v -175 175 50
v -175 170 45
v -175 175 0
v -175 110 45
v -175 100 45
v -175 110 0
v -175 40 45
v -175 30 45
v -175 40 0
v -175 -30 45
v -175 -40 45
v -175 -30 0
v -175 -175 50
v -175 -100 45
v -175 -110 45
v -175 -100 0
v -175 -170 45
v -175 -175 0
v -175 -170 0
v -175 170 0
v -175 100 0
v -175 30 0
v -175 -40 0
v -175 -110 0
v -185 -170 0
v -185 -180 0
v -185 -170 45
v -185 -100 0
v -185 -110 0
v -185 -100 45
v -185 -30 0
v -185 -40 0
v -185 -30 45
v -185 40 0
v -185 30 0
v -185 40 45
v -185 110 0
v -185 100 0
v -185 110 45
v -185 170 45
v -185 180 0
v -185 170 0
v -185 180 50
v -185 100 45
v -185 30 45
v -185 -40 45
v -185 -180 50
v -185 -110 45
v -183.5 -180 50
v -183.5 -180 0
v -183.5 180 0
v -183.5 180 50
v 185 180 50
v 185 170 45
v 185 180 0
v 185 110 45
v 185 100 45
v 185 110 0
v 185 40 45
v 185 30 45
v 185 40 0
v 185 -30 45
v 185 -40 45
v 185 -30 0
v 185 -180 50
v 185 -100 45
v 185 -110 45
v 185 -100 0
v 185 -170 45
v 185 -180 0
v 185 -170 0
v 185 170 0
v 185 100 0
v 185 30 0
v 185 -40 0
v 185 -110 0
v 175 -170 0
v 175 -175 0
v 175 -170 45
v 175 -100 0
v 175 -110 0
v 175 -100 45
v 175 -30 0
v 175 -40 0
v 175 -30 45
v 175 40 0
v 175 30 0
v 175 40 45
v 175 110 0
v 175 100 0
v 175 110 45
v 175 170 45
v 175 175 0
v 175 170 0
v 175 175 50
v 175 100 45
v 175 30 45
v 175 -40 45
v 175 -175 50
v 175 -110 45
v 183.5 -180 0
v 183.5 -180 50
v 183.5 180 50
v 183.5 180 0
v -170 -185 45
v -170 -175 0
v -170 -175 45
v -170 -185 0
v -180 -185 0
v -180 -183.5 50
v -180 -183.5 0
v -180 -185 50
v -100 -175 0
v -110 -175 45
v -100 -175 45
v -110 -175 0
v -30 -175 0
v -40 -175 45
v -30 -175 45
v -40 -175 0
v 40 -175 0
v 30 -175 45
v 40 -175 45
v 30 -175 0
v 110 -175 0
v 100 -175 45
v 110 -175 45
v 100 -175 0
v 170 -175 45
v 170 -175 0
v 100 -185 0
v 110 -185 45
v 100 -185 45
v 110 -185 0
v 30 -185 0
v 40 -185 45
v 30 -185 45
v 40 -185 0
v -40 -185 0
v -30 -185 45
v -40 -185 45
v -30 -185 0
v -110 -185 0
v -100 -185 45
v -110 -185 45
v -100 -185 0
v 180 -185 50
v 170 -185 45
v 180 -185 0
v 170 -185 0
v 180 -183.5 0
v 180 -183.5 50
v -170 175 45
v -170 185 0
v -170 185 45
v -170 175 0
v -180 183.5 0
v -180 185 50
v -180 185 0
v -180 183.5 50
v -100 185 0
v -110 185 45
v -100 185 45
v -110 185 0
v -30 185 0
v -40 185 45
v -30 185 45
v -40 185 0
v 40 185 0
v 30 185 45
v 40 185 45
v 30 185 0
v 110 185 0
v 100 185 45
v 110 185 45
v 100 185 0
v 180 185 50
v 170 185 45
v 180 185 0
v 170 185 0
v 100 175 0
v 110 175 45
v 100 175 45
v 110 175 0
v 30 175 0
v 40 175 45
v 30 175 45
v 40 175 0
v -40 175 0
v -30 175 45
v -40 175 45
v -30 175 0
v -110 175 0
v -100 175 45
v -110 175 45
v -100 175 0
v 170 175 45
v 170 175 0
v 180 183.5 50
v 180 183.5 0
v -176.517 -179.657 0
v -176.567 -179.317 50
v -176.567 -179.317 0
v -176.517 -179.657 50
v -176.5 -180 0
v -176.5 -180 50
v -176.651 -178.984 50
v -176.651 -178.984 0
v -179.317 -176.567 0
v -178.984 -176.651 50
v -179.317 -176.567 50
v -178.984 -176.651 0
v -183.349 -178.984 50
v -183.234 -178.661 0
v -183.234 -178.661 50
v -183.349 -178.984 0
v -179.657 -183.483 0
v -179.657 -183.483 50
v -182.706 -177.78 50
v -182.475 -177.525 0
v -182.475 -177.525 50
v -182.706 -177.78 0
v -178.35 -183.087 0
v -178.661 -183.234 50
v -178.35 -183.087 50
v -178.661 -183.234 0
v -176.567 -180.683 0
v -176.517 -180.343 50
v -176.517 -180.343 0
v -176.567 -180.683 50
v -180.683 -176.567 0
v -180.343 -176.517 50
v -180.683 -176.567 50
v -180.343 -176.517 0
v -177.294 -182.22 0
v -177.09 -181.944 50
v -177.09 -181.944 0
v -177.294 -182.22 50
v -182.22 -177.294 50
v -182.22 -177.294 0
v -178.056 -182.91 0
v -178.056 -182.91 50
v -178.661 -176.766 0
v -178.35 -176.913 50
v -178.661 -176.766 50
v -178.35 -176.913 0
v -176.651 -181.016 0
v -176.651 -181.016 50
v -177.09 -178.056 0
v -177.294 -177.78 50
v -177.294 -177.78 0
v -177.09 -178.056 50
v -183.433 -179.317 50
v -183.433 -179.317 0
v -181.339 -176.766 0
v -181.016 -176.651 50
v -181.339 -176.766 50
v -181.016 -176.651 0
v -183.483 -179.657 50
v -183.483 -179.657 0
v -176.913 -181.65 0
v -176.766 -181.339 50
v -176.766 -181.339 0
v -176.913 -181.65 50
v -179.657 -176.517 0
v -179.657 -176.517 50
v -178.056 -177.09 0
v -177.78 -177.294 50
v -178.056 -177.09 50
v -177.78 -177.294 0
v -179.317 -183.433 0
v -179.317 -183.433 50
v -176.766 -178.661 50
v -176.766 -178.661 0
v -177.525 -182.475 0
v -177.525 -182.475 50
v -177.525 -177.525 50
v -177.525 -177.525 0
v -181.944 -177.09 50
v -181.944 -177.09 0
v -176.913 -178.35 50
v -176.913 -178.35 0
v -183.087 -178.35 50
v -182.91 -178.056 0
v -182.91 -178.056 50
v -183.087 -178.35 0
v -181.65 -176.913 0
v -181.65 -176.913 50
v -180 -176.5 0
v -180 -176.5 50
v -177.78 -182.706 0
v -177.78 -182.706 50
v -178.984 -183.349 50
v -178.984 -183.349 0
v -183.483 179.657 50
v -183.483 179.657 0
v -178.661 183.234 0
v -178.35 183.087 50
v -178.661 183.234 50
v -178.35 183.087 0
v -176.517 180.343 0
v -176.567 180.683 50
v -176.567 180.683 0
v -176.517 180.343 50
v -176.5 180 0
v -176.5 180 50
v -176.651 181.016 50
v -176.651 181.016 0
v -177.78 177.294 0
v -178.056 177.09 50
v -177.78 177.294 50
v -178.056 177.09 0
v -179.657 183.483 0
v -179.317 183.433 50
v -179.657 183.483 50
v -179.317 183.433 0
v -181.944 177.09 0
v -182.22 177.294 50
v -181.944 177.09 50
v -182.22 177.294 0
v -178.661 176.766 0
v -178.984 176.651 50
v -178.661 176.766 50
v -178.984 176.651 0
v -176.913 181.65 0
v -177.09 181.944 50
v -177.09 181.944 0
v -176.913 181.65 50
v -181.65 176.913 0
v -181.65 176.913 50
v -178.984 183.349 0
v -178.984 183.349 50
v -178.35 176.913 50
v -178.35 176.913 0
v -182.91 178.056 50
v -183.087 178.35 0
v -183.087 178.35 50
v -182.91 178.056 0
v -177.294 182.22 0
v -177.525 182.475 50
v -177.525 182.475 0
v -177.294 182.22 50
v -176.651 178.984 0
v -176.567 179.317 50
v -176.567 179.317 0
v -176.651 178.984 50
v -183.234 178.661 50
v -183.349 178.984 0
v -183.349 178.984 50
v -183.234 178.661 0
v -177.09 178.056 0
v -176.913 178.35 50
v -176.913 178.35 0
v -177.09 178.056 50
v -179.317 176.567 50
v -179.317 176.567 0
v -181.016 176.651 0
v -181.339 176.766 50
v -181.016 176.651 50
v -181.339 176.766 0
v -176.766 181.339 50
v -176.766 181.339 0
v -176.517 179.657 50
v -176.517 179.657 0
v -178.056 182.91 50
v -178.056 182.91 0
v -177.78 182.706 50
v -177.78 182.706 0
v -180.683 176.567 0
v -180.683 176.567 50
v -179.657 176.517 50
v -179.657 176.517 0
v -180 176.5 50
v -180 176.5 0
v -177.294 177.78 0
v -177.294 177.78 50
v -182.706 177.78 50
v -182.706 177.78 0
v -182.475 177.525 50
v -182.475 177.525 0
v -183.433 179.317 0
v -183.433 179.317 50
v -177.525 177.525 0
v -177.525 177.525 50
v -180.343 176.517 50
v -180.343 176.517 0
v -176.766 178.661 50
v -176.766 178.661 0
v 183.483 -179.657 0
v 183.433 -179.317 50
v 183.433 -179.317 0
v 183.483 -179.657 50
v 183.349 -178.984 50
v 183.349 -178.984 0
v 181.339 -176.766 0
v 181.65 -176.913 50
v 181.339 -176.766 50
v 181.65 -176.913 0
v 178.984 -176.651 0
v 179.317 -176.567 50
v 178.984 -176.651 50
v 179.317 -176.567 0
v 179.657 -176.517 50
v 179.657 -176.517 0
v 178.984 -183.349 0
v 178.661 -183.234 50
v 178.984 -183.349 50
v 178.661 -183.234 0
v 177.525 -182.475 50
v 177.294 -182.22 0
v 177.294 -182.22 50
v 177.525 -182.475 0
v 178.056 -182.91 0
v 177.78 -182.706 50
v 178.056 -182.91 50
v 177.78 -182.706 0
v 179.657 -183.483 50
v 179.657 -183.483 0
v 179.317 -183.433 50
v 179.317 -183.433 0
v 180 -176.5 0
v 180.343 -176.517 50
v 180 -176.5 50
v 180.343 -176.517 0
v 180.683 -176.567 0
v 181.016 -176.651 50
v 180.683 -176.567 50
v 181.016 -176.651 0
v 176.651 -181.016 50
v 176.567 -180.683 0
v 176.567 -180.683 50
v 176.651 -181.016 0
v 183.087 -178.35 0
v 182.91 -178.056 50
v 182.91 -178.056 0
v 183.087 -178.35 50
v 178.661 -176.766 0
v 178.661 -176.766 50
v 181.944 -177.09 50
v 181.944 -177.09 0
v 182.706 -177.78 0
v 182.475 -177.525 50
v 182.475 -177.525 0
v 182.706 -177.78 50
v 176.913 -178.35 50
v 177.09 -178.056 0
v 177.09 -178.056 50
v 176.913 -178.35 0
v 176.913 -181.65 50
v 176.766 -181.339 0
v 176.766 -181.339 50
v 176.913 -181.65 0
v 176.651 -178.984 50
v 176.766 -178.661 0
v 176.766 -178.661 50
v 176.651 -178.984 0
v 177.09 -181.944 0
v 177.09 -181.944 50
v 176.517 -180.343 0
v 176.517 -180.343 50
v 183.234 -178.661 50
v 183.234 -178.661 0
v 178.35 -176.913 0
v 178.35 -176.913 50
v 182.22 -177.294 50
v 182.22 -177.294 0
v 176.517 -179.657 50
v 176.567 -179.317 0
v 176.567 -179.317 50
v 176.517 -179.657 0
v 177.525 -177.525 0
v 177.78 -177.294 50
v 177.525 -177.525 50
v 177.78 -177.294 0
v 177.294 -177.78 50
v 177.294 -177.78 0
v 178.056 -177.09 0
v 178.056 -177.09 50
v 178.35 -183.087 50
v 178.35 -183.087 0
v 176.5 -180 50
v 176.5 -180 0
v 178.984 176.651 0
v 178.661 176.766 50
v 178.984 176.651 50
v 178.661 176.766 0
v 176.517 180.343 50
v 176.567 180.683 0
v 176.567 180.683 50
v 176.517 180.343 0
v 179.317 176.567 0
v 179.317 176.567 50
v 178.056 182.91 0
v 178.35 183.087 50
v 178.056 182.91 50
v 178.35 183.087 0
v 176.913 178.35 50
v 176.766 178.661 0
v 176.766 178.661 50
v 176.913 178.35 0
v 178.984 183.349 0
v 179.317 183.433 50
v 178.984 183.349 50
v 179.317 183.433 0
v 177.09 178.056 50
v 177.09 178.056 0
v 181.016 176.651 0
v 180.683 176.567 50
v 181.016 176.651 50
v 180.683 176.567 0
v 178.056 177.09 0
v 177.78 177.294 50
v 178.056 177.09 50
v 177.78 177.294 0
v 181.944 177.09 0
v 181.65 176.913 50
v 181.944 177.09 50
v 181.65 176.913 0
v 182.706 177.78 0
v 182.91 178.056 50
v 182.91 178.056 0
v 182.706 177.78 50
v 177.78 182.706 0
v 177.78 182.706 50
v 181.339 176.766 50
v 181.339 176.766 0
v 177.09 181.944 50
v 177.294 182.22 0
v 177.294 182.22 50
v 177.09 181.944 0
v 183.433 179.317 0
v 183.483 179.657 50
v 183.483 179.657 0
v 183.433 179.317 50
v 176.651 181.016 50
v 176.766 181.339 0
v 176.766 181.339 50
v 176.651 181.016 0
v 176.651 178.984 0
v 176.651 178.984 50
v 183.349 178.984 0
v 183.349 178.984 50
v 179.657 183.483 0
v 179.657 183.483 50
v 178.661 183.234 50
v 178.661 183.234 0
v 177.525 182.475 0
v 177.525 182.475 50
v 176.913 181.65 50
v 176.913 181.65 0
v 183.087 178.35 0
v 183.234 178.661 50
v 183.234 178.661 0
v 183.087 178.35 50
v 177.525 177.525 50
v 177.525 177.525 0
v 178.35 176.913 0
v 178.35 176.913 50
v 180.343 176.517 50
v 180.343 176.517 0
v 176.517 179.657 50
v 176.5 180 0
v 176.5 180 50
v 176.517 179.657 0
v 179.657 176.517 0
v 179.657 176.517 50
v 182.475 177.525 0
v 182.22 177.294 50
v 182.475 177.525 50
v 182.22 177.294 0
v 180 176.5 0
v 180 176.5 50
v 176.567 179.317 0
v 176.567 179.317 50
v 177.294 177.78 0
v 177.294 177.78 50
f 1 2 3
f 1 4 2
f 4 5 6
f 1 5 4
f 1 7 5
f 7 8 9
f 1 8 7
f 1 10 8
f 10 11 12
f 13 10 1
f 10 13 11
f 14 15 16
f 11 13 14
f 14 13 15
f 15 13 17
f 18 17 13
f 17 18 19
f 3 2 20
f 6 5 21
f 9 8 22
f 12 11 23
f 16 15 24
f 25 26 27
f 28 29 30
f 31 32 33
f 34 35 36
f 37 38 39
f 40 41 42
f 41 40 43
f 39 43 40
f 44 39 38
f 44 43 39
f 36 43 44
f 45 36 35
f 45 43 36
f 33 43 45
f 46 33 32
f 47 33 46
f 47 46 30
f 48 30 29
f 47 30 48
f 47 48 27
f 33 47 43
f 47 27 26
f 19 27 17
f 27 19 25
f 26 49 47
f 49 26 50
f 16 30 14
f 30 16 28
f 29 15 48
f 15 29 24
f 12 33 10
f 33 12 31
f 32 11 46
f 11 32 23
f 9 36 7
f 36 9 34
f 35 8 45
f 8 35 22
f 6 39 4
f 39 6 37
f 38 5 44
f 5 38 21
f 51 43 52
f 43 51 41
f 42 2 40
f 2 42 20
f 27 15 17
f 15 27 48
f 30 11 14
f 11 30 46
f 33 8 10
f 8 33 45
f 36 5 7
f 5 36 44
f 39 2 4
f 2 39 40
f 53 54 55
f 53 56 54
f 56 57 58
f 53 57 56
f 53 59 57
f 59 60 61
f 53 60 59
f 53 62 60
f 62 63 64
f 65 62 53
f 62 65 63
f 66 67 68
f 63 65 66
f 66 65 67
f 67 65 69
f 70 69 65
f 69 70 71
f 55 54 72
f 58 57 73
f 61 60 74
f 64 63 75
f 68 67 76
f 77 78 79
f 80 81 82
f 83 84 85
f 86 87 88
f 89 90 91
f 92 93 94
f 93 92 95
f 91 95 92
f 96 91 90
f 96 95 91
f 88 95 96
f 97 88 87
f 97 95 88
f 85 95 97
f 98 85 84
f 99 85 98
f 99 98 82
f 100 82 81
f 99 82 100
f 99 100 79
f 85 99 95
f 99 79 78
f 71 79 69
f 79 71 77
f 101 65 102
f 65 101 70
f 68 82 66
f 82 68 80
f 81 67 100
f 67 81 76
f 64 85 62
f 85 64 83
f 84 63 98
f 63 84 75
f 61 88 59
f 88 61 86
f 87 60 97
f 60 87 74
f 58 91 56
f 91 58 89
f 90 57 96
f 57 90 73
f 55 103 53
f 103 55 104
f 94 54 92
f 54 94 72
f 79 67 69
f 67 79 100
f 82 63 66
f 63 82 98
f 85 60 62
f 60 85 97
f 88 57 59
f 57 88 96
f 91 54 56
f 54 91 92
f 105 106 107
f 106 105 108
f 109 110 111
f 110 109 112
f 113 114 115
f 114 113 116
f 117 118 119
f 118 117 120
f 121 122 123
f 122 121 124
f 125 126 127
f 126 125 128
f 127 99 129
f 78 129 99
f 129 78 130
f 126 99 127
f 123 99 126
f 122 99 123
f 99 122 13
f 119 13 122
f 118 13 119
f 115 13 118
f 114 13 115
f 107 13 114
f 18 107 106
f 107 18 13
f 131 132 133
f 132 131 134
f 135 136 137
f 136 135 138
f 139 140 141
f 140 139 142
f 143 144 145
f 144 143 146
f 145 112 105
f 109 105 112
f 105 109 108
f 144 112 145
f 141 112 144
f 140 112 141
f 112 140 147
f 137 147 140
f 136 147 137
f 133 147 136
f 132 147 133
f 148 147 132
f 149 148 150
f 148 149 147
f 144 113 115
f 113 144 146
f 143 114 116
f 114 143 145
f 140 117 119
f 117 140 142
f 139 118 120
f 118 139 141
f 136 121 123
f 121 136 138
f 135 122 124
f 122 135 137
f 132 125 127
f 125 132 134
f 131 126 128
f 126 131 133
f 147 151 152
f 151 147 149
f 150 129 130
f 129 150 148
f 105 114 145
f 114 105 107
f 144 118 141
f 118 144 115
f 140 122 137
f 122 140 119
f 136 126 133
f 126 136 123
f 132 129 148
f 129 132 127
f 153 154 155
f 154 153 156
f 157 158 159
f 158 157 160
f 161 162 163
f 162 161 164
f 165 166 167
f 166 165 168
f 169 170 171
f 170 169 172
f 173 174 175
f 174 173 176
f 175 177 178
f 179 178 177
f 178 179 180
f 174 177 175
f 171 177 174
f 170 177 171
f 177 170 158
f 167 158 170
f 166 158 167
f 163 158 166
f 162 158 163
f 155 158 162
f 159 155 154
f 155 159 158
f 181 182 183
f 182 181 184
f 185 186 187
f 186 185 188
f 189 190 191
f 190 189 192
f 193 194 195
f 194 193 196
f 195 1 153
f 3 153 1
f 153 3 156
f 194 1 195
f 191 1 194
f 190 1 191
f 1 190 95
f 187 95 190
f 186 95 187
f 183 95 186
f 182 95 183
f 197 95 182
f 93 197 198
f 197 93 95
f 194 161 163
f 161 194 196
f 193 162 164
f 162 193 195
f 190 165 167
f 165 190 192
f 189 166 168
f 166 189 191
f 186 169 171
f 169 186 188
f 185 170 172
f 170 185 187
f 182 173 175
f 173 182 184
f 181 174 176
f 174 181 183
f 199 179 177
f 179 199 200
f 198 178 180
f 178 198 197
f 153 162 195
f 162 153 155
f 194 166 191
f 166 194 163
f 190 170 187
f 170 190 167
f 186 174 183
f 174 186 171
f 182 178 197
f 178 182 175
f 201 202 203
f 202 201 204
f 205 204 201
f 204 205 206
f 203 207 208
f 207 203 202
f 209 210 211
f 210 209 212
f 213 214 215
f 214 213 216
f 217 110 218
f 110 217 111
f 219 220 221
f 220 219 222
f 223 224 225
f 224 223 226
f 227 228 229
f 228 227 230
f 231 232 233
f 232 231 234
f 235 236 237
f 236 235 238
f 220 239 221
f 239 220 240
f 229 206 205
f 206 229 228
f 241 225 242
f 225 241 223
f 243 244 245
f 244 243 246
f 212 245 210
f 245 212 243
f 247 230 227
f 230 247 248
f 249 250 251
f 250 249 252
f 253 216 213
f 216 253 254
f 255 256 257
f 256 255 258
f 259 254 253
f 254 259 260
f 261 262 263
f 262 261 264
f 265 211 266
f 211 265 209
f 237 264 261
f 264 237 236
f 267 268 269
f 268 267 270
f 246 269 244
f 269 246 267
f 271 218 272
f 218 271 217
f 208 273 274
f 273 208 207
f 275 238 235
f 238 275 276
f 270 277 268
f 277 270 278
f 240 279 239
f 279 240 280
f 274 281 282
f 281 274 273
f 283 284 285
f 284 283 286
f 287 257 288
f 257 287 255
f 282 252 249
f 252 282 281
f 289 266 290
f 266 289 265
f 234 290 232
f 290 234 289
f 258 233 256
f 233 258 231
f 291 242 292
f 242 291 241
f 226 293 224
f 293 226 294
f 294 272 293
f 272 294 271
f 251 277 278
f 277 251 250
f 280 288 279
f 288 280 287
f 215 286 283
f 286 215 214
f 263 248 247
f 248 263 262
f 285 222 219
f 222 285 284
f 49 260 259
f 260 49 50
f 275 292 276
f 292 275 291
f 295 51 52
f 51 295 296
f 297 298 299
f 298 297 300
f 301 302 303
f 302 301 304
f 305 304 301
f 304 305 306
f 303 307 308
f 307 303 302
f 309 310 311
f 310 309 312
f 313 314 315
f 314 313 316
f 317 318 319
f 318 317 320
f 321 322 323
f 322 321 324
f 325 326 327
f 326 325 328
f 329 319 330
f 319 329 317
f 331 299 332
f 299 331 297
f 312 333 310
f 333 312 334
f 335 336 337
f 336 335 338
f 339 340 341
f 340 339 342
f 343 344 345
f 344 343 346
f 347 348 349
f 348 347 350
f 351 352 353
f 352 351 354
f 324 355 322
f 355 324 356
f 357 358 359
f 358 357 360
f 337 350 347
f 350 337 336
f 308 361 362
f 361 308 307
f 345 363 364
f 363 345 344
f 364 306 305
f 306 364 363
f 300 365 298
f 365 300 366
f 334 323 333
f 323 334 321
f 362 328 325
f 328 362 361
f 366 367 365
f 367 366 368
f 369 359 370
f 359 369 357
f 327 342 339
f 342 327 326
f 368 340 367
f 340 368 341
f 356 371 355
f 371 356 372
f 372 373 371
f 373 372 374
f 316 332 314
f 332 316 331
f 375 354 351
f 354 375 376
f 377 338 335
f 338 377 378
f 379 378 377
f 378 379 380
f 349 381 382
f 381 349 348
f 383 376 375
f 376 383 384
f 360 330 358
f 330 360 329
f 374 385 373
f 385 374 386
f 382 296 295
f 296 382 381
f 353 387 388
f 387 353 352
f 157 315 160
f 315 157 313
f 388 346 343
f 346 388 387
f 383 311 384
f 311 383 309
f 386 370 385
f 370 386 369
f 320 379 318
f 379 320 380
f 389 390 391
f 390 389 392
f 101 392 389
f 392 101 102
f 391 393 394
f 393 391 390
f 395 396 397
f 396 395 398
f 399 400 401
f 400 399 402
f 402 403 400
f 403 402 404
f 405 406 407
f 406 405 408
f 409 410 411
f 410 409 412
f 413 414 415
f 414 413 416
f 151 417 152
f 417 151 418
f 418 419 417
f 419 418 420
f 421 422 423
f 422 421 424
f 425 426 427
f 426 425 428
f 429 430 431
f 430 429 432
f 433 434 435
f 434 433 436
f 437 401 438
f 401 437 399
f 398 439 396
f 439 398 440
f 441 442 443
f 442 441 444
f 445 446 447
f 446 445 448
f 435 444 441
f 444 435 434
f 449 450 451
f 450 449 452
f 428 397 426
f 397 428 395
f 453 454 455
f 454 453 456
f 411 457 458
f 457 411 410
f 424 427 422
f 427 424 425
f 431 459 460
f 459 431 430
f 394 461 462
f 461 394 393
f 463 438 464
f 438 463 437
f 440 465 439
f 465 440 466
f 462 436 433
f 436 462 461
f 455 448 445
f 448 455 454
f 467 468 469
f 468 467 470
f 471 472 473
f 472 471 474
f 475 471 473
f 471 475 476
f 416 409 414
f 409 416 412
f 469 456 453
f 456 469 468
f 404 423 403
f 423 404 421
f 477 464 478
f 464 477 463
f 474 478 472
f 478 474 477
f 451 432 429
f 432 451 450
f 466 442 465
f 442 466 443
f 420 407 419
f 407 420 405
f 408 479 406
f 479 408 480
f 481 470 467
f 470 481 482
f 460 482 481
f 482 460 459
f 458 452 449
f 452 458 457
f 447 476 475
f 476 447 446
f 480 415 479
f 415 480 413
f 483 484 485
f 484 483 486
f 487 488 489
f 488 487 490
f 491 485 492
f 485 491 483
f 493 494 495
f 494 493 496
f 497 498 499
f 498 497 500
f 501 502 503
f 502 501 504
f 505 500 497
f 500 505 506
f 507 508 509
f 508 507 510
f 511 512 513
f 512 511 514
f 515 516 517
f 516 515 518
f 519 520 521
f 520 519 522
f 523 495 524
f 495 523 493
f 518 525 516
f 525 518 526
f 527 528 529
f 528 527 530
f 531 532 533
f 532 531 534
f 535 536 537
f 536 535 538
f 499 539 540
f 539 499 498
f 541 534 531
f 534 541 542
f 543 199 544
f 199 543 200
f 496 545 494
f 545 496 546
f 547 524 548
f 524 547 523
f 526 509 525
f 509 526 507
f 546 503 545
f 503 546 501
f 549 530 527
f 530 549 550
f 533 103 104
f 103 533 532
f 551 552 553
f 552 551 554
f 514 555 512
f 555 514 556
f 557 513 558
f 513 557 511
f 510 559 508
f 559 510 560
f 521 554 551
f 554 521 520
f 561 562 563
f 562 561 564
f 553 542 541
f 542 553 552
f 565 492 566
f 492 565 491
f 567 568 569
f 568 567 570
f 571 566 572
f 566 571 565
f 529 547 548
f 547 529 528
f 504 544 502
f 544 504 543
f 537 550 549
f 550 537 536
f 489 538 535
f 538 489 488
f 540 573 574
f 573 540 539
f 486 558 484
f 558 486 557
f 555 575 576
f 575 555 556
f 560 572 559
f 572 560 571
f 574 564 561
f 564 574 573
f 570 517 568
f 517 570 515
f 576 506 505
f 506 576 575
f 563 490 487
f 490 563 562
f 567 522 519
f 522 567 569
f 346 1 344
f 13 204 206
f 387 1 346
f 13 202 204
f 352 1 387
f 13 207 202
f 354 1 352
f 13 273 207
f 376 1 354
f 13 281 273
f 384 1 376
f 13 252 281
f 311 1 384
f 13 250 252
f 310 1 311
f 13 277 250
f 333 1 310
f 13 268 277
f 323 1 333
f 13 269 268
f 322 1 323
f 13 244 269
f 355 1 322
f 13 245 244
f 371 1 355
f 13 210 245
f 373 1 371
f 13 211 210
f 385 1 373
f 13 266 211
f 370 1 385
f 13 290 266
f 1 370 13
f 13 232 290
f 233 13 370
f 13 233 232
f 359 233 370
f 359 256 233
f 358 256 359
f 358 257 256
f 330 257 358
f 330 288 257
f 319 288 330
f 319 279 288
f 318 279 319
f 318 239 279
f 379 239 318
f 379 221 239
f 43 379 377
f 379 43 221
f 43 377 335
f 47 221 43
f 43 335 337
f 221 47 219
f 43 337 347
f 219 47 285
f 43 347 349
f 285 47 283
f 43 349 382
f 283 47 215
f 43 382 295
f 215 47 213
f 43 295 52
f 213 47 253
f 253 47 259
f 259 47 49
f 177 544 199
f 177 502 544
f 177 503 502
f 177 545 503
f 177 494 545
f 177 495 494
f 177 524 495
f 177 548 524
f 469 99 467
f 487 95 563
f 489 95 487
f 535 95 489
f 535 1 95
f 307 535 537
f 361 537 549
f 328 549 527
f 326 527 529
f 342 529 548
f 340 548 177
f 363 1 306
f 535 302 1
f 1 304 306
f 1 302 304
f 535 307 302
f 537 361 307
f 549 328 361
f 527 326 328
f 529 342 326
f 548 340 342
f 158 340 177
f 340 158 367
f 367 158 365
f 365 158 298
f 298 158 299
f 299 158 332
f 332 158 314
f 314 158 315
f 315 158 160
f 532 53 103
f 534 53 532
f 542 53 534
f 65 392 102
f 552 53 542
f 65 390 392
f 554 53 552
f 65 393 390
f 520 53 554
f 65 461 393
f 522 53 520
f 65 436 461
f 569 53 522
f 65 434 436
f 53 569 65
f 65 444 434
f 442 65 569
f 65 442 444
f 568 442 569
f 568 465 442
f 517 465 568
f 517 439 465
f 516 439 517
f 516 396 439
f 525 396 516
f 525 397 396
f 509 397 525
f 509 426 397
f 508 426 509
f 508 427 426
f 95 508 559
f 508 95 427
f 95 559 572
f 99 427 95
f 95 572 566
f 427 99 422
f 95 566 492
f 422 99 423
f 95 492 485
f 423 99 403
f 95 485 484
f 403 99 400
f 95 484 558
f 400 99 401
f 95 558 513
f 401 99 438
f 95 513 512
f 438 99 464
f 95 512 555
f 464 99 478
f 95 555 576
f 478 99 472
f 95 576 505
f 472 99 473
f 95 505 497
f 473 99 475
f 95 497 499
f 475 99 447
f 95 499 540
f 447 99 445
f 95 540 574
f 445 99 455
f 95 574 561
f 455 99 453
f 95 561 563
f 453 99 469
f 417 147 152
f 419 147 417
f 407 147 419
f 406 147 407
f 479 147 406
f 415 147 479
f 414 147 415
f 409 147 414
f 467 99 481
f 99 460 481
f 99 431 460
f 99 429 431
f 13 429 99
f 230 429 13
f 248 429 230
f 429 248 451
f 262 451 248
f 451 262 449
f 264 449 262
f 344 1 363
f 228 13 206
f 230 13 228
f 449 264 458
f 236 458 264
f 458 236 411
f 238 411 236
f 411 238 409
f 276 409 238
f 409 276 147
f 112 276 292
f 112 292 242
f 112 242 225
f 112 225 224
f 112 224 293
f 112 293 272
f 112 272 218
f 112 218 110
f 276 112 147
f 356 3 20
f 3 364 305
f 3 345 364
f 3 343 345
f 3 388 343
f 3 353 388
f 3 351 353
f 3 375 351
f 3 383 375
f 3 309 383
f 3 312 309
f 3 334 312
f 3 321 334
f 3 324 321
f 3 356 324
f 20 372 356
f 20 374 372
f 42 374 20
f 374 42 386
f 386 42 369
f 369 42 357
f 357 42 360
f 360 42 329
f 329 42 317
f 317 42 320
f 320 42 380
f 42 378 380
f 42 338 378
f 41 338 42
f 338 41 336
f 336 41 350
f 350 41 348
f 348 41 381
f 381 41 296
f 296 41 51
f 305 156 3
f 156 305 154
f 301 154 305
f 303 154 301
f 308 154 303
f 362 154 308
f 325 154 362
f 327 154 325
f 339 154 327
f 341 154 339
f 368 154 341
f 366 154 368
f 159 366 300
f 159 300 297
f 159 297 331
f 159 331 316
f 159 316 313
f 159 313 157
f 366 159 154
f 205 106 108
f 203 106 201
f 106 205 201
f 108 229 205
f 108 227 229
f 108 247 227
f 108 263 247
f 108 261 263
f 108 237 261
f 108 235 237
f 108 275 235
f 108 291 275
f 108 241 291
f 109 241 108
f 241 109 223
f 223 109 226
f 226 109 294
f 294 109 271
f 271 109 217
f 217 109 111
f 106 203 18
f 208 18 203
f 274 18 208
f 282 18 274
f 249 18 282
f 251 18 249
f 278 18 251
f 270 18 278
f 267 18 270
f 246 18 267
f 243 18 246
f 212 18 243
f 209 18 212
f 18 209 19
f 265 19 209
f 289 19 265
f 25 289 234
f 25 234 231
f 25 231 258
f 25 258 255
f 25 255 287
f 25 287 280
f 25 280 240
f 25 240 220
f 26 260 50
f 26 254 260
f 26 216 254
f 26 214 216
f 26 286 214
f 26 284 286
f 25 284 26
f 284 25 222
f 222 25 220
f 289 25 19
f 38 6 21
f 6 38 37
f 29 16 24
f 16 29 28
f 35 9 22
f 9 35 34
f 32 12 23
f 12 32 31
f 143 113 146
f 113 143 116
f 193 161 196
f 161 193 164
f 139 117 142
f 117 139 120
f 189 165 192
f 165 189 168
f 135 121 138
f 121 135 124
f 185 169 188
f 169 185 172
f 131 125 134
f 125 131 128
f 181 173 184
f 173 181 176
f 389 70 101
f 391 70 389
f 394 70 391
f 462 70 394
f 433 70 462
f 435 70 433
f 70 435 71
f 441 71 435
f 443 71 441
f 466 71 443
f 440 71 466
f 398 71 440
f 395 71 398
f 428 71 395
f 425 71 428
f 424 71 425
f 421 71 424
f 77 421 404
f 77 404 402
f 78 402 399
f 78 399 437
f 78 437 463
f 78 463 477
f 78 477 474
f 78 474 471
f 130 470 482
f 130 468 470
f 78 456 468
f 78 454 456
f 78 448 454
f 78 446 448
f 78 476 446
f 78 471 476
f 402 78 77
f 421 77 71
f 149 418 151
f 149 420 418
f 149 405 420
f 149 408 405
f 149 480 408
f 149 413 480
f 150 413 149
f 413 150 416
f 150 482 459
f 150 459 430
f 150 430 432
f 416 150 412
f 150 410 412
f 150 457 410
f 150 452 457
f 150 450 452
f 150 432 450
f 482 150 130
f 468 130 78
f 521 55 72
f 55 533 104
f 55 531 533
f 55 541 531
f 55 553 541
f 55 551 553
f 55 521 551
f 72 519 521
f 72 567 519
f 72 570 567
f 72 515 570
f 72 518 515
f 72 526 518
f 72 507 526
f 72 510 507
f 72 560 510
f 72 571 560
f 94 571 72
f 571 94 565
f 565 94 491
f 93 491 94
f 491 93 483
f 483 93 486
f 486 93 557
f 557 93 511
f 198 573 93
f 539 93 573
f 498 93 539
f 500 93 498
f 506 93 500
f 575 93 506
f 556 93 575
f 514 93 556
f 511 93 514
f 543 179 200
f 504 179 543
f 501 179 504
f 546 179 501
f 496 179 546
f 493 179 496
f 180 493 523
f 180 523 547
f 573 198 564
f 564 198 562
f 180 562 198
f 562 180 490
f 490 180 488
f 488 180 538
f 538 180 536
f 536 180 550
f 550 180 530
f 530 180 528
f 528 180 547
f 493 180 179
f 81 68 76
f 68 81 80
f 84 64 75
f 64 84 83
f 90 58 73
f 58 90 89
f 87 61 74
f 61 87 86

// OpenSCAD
/*
  Cage slice 03 of 15
*/

bar = 10;
half_inner = 175;
gap = 70;
rod_d = 7;
half_outer = half_inner + bar;

function grid_pos(n) = -half_inner + n * gap;

module cage_full() {
  difference() {
    union() {
      // Floor grid at z = -10 .. 0
      for (j = [0:5]) {
        y = grid_pos(j);
        translate([-half_inner, y - bar/2, -bar])
          cube([2*half_inner, bar, bar], center=false);
      }
      for (i = [0:5]) {
        x = grid_pos(i);
        translate([x - bar/2, -half_inner, -bar])
          cube([bar, 2*half_inner, bar], center=false);
      }

      // Roof grid at z = 700 .. 710
      for (j = [0:5]) {
        y = grid_pos(j);
        translate([-half_inner, y - bar/2, 700])
          cube([2*half_inner, bar, bar], center=false);
      }
      for (i = [0:5]) {
        x = grid_pos(i);
        translate([x - bar/2, -half_inner, 700])
          cube([bar, 2*half_inner, bar], center=false);
      }

      // Side walls at x = ±175
      for (side = [-1, 1]) {
        sx = side * half_inner;
        x0 = (side == 1) ? sx : sx - bar;
        for (j = [0:5]) {
          y = grid_pos(j);
          translate([x0, y - bar/2, 0])
            cube([bar, bar, 700], center=false);
        }
        for (k = [0:10]) {
          zc = 0 + k * gap;
          translate([x0, -half_inner, zc - bar/2])
            cube([bar, 2*half_inner, bar], center=false);
        }
      }

      // Front/back walls at y = ±175
      for (side = [-1, 1]) {
        sy = side * half_inner;
        y0 = (side == 1) ? sy : sy - bar;
        for (i = [0:5]) {
          x = grid_pos(i);
          translate([x - bar/2, y0, 0])
            cube([bar, bar, 700], center=false);
        }
        for (k = [0:10]) {
          zc = 0 + k * gap;
          translate([-half_inner, y0, zc - bar/2])
            cube([2*half_inner, bar, bar], center=false);
        }
      }
    }

    for (sx = [-1, 1], sy = [-1, 1]) {
      translate([sx * (half_inner + bar/2),
                 sy * (half_inner + bar/2),
                 -20])
        cylinder(d = rod_d, h = 740, $fn = 64);
    }
  }
}

z_min = 90;
z_max = 140;  // height 50 mm

module slice() {
  intersection() {
    cage_full();
    translate([-half_outer - 5, -half_outer - 5, z_min])
      cube([2*(half_outer + 5), 2*(half_outer + 5), z_max - z_min], center=false);
  }
}

translate([0, 0, -z_min])
  slice();
